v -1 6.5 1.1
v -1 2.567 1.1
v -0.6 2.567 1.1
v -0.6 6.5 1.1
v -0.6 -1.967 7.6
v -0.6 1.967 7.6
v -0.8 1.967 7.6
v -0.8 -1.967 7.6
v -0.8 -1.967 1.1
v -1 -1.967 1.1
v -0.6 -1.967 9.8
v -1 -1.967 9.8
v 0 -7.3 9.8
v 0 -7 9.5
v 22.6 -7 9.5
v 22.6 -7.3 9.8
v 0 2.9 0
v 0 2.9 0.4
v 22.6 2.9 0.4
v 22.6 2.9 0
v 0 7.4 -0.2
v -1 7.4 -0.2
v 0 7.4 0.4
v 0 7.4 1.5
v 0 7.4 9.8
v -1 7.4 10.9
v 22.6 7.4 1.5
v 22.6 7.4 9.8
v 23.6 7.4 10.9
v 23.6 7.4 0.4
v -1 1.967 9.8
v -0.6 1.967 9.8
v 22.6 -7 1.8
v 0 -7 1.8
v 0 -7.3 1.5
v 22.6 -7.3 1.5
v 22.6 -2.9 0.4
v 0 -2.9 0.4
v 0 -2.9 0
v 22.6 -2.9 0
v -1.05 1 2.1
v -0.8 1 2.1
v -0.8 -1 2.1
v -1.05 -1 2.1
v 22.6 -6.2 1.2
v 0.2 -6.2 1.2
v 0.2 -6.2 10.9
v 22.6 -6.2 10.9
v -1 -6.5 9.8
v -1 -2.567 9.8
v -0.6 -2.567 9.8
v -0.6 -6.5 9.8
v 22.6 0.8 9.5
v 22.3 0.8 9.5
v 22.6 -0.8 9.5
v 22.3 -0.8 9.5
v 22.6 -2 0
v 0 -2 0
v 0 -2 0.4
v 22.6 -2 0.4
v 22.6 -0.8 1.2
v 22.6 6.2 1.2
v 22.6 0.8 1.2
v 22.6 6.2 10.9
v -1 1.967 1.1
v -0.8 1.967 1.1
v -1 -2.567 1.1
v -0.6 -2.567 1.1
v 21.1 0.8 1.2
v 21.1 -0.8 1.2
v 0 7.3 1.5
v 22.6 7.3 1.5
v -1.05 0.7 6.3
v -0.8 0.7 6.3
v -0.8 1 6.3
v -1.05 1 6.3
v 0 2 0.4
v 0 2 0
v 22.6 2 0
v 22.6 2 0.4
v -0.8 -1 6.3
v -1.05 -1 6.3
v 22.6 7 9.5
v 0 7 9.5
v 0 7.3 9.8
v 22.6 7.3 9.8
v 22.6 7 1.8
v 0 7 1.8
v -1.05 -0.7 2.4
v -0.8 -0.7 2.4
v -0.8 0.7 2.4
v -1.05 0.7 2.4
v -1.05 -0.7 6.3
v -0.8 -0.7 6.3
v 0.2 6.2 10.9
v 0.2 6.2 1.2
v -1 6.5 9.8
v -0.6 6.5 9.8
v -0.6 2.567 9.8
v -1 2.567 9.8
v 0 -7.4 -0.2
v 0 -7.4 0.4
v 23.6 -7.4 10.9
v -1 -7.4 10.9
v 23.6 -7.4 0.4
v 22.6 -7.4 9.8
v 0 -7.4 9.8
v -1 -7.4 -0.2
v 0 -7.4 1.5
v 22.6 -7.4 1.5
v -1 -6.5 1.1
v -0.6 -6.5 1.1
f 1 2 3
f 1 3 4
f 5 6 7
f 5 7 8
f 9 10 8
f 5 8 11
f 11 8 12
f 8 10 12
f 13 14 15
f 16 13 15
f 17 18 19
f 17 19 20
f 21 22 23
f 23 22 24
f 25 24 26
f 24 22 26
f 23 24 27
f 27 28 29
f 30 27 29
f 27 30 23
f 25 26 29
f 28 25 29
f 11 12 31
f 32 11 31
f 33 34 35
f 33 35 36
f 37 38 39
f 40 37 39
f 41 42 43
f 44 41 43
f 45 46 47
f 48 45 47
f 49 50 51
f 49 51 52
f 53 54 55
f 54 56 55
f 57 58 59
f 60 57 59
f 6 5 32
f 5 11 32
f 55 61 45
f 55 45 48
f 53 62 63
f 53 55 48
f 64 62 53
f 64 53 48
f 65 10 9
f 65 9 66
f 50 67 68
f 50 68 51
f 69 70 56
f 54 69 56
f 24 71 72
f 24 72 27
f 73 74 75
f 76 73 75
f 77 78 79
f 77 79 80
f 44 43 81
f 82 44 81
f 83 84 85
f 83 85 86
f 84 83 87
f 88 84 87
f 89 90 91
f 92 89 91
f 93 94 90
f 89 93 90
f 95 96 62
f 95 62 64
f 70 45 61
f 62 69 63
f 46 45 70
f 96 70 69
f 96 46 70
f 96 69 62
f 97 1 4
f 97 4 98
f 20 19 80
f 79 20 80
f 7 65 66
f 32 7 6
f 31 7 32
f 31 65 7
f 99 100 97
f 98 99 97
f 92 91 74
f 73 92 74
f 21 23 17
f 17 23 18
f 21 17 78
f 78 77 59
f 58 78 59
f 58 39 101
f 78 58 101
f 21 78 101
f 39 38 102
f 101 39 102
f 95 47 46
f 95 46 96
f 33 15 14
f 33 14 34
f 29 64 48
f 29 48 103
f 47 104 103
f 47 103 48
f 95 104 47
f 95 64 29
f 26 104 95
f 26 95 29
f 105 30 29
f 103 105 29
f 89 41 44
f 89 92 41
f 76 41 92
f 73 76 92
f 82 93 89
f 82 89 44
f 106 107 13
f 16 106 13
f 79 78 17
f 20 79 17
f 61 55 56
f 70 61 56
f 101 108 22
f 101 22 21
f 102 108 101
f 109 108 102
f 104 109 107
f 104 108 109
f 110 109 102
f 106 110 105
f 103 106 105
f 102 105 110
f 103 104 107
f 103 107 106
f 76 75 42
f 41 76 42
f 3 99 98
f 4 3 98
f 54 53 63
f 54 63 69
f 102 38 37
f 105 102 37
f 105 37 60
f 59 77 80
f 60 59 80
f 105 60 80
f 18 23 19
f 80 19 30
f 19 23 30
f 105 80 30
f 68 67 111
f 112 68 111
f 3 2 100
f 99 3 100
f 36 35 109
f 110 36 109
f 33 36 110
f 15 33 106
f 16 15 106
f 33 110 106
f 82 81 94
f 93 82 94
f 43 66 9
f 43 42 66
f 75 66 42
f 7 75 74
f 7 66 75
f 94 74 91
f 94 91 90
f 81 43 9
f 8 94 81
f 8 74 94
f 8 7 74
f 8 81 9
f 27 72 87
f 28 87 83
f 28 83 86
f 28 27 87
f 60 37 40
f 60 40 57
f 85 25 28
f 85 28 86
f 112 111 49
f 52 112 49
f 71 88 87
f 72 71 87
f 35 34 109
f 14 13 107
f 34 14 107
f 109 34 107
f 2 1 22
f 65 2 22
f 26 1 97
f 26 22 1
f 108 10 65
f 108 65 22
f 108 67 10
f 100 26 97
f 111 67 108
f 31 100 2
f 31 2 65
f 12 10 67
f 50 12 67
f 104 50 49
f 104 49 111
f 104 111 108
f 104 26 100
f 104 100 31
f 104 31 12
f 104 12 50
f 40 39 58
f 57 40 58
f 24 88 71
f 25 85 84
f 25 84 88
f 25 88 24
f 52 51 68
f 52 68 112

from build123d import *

# Parameters (mm, degrees)
F1_DEPTH  = 22.6
F2_W      = 1
F2_H      = 10.5
F3_DEPTH  = 7.4
F4_W      = 7.4
F4_H      = 10.9
F5_DEPTH  = 1
F6_DEPTH  = 0.2
F7_W      = 3.9333333333
F7_H      = 8.7
F7_W_2    = 1.9666666667
F8_DEPTH  = 0.4
F9_SIZE   = 0.3
F11_DEPTH = 0.8
F13_W     = 1
F13_H     = 14.8
F14_DEPTH = 0.2
F15_W     = 3.9333333333
F15_H     = 6.5
F16_DEPTH = 0.2
F18_DEPTH = 0.25


with BuildPart() as f1:
    # F0 (on Right) → F1 (new body)
    with BuildSketch(Plane.YZ):
        Polygon((-6.2, 10.9), (-7.4, 10.9), (-7.4, 9.8), (-7, 9.8), (-7, 1.5), (-7.4, 1.5), (-7.4, 0.4), (-2.9, 0.4), (-2.9, 0), (-2, 0), (-2, 0.4), (0, 0.4), (0, 1.2), (-6.2, 1.2), align=None)
    extrude(amount=F1_DEPTH)

    # F2 (on face) → F3 (join, through all)
    with BuildSketch(Plane.XZ.offset(7.4)):
        with Locations((23.1, 5.65)):
            Rectangle(F2_W, F2_H)
    extrude(amount=-F3_DEPTH)

    # F4 (on face) → F5 (join)
    with BuildSketch(Plane(origin=(0, 0, 0), x_dir=(0, -1, 0), z_dir=(-1, 0, 0))):
        with Locations((3.7, 5.45)):
            Rectangle(F4_W, F4_H)
    extrude(amount=F5_DEPTH)

    # F6 (add): a face of the model
    f6_faces = [f1.faces().sort_by_distance(p)[0] for p in [
        (0, -3.1, 6.05),
    ]]
    extrude(f6_faces, amount=F6_DEPTH)

    # F7 (on face) → F8 (cut)
    with BuildSketch(Plane(origin=(-1, 0, 0), x_dir=(0, -1, 0), z_dir=(-1, 0, 0))):
        with Locations((4.5333333333, 5.45)):
            Rectangle(F7_W, F7_H)
        with Locations((0.9833333333, 5.45)):
            Rectangle(F7_W_2, F7_H)
    extrude(amount=-F8_DEPTH, mode=Mode.SUBTRACT)

    # F9
    f9_edges = [f1.edges().sort_by_distance(p)[0] for p in [
        (11.3, -7, 1.5),
        (11.3, -7, 9.8),
    ]]
    chamfer(f9_edges, length=F9_SIZE)

    # F10 (on face) → F11 (join)
    with BuildSketch(Plane(origin=(0, 0, 0), x_dir=(-1, 0, 0), z_dir=(0, 1, 0))):
        Polygon((-22.6, 9.5), (-22.6, 1.2), (-21.1, 1.2), (-22.3, 9.5), align=None)
    extrude(amount=-F11_DEPTH)

    # F12: F1 across face


with BuildPart() as f1_1:
    add(f1.part)
    add(f1.part.mirror(Plane(origin=(13.4187293548, 0, 3.5023232768), x_dir=(-1, 0, 0), z_dir=(0, 1, 0))))

    # F13 (on face) → F14 (join)
    with BuildSketch(Plane(origin=(0, 0, 0), x_dir=(1, 0, 0), z_dir=(0, 0, -1))):
        with Locations((-0.5, 0)):
            Rectangle(F13_W, F13_H)
    extrude(amount=F14_DEPTH)

    # F15 (on face) → F16 (join)
    with BuildSketch(Plane(origin=(-0.6, 0, 0), x_dir=(0, -1, 0), z_dir=(-1, 0, 0))):
        with Locations((0, 4.35)):
            Rectangle(F15_W, F15_H)
    extrude(amount=F16_DEPTH)

    # F17 (on face) → F18 (join)
    with BuildSketch(Plane(origin=(-0.8, 0, 0), x_dir=(0, -1, 0), z_dir=(-1, 0, 0))):
        Polygon((-0.7, 6.3), (-1, 6.3), (-1, 2.1), (1, 2.1), (1, 6.3), (0.7, 6.3), (0.7, 2.4), (-0.7, 2.4), align=None)
    extrude(amount=F18_DEPTH)


solid = f1_1.part
